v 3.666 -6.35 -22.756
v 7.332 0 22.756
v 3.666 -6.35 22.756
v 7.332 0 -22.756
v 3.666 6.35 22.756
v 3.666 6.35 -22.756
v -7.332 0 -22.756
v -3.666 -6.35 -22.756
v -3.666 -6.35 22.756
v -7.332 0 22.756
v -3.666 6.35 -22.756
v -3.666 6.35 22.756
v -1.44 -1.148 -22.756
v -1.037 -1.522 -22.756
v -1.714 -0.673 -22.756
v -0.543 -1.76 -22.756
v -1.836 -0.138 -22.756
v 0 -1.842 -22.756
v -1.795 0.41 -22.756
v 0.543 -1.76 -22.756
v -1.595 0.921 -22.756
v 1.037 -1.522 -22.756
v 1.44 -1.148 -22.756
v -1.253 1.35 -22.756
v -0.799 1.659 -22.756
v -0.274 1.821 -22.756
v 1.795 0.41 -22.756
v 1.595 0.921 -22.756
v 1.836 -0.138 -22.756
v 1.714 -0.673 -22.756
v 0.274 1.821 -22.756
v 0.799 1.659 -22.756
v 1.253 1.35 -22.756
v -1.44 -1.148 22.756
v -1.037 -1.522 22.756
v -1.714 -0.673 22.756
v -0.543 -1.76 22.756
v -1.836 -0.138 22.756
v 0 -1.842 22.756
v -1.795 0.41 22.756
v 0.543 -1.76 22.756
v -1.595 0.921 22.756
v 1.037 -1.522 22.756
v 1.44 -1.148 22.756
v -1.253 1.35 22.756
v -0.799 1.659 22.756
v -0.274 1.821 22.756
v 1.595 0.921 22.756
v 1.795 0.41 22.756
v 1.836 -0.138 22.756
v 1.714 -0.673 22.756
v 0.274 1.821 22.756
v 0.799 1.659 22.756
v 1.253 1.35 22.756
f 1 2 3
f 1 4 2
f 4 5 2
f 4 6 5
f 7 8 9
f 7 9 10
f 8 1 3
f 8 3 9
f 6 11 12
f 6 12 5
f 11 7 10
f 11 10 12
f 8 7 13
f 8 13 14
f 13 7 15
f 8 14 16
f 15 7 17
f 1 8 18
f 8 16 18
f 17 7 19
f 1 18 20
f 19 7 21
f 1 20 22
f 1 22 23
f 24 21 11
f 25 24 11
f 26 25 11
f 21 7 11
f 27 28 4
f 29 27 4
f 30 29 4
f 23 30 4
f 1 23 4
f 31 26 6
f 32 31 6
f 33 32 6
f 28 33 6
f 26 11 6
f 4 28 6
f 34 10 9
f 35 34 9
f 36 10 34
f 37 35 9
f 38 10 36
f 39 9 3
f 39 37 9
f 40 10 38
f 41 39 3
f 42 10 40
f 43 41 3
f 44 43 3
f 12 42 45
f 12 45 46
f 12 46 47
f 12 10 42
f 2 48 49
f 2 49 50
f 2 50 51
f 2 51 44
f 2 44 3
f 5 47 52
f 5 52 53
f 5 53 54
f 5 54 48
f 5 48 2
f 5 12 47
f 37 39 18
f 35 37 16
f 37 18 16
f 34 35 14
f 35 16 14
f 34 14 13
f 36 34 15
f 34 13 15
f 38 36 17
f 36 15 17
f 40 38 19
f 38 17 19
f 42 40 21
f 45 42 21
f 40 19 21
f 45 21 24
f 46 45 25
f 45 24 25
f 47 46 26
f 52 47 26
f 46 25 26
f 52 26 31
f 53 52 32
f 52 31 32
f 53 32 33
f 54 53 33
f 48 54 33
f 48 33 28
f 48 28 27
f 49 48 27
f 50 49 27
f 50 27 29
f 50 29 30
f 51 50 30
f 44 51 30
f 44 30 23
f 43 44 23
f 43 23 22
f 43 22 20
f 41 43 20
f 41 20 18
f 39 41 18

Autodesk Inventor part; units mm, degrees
ref_plane "YZ Plane" through (0, 0, 0) normal (1, 0, 0) x (0, 1, 0)
ref_plane "XZ Plane" through (0, 0, 0) normal (0, 1, 0) x (-1, 0, 0)
ref_plane "XY Plane" through (0, 0, 0) normal (0, 0, 1) x (1, 0, 0)
sketch "Sketch1" plane through (0, 0, 0) normal (0, 0, 1) x (1, 0, 0)
  line L0 (-7.3323, 0) -> (-3.6662, 6.35)
  line L1 (-3.6662, 6.35) -> (3.6662, 6.35)
  line L2 (3.6662, 6.35) -> (7.3323, 0)
  line L3 (7.3323, 0) -> (3.6662, -6.35)
  line L4 (3.6662, -6.35) -> (-3.6662, -6.35)
  line L5 (-3.6662, -6.35) -> (-7.3323, 0)
  point P0 (0, 0)
  point P1 (0, 0)
  dimension "d0" = 12.7
extrude "Extrusion1" add sketch "Sketch1" along normal mid plane 45.512
sketch "Sketch2" plane through (0, 0, 22.756) normal (0, 0, 1) x (1, 0, 0)
  point P0 (0, 0)
hole "Hole1" at (0, 0, 22.756) direction (0, 0, -1) diameter 3.683 end through all thread size "10-24 UNC" class "2B" standard "ANSI Unified Screw Threads"
mirror "Mirror1" about plane through (0, 0, 0) normal (0, 0, 1) of "Hole1"
properties part number "PULLY_HEX_SHAFT_INTAKE" material "Aluminum, 6061-T6"
